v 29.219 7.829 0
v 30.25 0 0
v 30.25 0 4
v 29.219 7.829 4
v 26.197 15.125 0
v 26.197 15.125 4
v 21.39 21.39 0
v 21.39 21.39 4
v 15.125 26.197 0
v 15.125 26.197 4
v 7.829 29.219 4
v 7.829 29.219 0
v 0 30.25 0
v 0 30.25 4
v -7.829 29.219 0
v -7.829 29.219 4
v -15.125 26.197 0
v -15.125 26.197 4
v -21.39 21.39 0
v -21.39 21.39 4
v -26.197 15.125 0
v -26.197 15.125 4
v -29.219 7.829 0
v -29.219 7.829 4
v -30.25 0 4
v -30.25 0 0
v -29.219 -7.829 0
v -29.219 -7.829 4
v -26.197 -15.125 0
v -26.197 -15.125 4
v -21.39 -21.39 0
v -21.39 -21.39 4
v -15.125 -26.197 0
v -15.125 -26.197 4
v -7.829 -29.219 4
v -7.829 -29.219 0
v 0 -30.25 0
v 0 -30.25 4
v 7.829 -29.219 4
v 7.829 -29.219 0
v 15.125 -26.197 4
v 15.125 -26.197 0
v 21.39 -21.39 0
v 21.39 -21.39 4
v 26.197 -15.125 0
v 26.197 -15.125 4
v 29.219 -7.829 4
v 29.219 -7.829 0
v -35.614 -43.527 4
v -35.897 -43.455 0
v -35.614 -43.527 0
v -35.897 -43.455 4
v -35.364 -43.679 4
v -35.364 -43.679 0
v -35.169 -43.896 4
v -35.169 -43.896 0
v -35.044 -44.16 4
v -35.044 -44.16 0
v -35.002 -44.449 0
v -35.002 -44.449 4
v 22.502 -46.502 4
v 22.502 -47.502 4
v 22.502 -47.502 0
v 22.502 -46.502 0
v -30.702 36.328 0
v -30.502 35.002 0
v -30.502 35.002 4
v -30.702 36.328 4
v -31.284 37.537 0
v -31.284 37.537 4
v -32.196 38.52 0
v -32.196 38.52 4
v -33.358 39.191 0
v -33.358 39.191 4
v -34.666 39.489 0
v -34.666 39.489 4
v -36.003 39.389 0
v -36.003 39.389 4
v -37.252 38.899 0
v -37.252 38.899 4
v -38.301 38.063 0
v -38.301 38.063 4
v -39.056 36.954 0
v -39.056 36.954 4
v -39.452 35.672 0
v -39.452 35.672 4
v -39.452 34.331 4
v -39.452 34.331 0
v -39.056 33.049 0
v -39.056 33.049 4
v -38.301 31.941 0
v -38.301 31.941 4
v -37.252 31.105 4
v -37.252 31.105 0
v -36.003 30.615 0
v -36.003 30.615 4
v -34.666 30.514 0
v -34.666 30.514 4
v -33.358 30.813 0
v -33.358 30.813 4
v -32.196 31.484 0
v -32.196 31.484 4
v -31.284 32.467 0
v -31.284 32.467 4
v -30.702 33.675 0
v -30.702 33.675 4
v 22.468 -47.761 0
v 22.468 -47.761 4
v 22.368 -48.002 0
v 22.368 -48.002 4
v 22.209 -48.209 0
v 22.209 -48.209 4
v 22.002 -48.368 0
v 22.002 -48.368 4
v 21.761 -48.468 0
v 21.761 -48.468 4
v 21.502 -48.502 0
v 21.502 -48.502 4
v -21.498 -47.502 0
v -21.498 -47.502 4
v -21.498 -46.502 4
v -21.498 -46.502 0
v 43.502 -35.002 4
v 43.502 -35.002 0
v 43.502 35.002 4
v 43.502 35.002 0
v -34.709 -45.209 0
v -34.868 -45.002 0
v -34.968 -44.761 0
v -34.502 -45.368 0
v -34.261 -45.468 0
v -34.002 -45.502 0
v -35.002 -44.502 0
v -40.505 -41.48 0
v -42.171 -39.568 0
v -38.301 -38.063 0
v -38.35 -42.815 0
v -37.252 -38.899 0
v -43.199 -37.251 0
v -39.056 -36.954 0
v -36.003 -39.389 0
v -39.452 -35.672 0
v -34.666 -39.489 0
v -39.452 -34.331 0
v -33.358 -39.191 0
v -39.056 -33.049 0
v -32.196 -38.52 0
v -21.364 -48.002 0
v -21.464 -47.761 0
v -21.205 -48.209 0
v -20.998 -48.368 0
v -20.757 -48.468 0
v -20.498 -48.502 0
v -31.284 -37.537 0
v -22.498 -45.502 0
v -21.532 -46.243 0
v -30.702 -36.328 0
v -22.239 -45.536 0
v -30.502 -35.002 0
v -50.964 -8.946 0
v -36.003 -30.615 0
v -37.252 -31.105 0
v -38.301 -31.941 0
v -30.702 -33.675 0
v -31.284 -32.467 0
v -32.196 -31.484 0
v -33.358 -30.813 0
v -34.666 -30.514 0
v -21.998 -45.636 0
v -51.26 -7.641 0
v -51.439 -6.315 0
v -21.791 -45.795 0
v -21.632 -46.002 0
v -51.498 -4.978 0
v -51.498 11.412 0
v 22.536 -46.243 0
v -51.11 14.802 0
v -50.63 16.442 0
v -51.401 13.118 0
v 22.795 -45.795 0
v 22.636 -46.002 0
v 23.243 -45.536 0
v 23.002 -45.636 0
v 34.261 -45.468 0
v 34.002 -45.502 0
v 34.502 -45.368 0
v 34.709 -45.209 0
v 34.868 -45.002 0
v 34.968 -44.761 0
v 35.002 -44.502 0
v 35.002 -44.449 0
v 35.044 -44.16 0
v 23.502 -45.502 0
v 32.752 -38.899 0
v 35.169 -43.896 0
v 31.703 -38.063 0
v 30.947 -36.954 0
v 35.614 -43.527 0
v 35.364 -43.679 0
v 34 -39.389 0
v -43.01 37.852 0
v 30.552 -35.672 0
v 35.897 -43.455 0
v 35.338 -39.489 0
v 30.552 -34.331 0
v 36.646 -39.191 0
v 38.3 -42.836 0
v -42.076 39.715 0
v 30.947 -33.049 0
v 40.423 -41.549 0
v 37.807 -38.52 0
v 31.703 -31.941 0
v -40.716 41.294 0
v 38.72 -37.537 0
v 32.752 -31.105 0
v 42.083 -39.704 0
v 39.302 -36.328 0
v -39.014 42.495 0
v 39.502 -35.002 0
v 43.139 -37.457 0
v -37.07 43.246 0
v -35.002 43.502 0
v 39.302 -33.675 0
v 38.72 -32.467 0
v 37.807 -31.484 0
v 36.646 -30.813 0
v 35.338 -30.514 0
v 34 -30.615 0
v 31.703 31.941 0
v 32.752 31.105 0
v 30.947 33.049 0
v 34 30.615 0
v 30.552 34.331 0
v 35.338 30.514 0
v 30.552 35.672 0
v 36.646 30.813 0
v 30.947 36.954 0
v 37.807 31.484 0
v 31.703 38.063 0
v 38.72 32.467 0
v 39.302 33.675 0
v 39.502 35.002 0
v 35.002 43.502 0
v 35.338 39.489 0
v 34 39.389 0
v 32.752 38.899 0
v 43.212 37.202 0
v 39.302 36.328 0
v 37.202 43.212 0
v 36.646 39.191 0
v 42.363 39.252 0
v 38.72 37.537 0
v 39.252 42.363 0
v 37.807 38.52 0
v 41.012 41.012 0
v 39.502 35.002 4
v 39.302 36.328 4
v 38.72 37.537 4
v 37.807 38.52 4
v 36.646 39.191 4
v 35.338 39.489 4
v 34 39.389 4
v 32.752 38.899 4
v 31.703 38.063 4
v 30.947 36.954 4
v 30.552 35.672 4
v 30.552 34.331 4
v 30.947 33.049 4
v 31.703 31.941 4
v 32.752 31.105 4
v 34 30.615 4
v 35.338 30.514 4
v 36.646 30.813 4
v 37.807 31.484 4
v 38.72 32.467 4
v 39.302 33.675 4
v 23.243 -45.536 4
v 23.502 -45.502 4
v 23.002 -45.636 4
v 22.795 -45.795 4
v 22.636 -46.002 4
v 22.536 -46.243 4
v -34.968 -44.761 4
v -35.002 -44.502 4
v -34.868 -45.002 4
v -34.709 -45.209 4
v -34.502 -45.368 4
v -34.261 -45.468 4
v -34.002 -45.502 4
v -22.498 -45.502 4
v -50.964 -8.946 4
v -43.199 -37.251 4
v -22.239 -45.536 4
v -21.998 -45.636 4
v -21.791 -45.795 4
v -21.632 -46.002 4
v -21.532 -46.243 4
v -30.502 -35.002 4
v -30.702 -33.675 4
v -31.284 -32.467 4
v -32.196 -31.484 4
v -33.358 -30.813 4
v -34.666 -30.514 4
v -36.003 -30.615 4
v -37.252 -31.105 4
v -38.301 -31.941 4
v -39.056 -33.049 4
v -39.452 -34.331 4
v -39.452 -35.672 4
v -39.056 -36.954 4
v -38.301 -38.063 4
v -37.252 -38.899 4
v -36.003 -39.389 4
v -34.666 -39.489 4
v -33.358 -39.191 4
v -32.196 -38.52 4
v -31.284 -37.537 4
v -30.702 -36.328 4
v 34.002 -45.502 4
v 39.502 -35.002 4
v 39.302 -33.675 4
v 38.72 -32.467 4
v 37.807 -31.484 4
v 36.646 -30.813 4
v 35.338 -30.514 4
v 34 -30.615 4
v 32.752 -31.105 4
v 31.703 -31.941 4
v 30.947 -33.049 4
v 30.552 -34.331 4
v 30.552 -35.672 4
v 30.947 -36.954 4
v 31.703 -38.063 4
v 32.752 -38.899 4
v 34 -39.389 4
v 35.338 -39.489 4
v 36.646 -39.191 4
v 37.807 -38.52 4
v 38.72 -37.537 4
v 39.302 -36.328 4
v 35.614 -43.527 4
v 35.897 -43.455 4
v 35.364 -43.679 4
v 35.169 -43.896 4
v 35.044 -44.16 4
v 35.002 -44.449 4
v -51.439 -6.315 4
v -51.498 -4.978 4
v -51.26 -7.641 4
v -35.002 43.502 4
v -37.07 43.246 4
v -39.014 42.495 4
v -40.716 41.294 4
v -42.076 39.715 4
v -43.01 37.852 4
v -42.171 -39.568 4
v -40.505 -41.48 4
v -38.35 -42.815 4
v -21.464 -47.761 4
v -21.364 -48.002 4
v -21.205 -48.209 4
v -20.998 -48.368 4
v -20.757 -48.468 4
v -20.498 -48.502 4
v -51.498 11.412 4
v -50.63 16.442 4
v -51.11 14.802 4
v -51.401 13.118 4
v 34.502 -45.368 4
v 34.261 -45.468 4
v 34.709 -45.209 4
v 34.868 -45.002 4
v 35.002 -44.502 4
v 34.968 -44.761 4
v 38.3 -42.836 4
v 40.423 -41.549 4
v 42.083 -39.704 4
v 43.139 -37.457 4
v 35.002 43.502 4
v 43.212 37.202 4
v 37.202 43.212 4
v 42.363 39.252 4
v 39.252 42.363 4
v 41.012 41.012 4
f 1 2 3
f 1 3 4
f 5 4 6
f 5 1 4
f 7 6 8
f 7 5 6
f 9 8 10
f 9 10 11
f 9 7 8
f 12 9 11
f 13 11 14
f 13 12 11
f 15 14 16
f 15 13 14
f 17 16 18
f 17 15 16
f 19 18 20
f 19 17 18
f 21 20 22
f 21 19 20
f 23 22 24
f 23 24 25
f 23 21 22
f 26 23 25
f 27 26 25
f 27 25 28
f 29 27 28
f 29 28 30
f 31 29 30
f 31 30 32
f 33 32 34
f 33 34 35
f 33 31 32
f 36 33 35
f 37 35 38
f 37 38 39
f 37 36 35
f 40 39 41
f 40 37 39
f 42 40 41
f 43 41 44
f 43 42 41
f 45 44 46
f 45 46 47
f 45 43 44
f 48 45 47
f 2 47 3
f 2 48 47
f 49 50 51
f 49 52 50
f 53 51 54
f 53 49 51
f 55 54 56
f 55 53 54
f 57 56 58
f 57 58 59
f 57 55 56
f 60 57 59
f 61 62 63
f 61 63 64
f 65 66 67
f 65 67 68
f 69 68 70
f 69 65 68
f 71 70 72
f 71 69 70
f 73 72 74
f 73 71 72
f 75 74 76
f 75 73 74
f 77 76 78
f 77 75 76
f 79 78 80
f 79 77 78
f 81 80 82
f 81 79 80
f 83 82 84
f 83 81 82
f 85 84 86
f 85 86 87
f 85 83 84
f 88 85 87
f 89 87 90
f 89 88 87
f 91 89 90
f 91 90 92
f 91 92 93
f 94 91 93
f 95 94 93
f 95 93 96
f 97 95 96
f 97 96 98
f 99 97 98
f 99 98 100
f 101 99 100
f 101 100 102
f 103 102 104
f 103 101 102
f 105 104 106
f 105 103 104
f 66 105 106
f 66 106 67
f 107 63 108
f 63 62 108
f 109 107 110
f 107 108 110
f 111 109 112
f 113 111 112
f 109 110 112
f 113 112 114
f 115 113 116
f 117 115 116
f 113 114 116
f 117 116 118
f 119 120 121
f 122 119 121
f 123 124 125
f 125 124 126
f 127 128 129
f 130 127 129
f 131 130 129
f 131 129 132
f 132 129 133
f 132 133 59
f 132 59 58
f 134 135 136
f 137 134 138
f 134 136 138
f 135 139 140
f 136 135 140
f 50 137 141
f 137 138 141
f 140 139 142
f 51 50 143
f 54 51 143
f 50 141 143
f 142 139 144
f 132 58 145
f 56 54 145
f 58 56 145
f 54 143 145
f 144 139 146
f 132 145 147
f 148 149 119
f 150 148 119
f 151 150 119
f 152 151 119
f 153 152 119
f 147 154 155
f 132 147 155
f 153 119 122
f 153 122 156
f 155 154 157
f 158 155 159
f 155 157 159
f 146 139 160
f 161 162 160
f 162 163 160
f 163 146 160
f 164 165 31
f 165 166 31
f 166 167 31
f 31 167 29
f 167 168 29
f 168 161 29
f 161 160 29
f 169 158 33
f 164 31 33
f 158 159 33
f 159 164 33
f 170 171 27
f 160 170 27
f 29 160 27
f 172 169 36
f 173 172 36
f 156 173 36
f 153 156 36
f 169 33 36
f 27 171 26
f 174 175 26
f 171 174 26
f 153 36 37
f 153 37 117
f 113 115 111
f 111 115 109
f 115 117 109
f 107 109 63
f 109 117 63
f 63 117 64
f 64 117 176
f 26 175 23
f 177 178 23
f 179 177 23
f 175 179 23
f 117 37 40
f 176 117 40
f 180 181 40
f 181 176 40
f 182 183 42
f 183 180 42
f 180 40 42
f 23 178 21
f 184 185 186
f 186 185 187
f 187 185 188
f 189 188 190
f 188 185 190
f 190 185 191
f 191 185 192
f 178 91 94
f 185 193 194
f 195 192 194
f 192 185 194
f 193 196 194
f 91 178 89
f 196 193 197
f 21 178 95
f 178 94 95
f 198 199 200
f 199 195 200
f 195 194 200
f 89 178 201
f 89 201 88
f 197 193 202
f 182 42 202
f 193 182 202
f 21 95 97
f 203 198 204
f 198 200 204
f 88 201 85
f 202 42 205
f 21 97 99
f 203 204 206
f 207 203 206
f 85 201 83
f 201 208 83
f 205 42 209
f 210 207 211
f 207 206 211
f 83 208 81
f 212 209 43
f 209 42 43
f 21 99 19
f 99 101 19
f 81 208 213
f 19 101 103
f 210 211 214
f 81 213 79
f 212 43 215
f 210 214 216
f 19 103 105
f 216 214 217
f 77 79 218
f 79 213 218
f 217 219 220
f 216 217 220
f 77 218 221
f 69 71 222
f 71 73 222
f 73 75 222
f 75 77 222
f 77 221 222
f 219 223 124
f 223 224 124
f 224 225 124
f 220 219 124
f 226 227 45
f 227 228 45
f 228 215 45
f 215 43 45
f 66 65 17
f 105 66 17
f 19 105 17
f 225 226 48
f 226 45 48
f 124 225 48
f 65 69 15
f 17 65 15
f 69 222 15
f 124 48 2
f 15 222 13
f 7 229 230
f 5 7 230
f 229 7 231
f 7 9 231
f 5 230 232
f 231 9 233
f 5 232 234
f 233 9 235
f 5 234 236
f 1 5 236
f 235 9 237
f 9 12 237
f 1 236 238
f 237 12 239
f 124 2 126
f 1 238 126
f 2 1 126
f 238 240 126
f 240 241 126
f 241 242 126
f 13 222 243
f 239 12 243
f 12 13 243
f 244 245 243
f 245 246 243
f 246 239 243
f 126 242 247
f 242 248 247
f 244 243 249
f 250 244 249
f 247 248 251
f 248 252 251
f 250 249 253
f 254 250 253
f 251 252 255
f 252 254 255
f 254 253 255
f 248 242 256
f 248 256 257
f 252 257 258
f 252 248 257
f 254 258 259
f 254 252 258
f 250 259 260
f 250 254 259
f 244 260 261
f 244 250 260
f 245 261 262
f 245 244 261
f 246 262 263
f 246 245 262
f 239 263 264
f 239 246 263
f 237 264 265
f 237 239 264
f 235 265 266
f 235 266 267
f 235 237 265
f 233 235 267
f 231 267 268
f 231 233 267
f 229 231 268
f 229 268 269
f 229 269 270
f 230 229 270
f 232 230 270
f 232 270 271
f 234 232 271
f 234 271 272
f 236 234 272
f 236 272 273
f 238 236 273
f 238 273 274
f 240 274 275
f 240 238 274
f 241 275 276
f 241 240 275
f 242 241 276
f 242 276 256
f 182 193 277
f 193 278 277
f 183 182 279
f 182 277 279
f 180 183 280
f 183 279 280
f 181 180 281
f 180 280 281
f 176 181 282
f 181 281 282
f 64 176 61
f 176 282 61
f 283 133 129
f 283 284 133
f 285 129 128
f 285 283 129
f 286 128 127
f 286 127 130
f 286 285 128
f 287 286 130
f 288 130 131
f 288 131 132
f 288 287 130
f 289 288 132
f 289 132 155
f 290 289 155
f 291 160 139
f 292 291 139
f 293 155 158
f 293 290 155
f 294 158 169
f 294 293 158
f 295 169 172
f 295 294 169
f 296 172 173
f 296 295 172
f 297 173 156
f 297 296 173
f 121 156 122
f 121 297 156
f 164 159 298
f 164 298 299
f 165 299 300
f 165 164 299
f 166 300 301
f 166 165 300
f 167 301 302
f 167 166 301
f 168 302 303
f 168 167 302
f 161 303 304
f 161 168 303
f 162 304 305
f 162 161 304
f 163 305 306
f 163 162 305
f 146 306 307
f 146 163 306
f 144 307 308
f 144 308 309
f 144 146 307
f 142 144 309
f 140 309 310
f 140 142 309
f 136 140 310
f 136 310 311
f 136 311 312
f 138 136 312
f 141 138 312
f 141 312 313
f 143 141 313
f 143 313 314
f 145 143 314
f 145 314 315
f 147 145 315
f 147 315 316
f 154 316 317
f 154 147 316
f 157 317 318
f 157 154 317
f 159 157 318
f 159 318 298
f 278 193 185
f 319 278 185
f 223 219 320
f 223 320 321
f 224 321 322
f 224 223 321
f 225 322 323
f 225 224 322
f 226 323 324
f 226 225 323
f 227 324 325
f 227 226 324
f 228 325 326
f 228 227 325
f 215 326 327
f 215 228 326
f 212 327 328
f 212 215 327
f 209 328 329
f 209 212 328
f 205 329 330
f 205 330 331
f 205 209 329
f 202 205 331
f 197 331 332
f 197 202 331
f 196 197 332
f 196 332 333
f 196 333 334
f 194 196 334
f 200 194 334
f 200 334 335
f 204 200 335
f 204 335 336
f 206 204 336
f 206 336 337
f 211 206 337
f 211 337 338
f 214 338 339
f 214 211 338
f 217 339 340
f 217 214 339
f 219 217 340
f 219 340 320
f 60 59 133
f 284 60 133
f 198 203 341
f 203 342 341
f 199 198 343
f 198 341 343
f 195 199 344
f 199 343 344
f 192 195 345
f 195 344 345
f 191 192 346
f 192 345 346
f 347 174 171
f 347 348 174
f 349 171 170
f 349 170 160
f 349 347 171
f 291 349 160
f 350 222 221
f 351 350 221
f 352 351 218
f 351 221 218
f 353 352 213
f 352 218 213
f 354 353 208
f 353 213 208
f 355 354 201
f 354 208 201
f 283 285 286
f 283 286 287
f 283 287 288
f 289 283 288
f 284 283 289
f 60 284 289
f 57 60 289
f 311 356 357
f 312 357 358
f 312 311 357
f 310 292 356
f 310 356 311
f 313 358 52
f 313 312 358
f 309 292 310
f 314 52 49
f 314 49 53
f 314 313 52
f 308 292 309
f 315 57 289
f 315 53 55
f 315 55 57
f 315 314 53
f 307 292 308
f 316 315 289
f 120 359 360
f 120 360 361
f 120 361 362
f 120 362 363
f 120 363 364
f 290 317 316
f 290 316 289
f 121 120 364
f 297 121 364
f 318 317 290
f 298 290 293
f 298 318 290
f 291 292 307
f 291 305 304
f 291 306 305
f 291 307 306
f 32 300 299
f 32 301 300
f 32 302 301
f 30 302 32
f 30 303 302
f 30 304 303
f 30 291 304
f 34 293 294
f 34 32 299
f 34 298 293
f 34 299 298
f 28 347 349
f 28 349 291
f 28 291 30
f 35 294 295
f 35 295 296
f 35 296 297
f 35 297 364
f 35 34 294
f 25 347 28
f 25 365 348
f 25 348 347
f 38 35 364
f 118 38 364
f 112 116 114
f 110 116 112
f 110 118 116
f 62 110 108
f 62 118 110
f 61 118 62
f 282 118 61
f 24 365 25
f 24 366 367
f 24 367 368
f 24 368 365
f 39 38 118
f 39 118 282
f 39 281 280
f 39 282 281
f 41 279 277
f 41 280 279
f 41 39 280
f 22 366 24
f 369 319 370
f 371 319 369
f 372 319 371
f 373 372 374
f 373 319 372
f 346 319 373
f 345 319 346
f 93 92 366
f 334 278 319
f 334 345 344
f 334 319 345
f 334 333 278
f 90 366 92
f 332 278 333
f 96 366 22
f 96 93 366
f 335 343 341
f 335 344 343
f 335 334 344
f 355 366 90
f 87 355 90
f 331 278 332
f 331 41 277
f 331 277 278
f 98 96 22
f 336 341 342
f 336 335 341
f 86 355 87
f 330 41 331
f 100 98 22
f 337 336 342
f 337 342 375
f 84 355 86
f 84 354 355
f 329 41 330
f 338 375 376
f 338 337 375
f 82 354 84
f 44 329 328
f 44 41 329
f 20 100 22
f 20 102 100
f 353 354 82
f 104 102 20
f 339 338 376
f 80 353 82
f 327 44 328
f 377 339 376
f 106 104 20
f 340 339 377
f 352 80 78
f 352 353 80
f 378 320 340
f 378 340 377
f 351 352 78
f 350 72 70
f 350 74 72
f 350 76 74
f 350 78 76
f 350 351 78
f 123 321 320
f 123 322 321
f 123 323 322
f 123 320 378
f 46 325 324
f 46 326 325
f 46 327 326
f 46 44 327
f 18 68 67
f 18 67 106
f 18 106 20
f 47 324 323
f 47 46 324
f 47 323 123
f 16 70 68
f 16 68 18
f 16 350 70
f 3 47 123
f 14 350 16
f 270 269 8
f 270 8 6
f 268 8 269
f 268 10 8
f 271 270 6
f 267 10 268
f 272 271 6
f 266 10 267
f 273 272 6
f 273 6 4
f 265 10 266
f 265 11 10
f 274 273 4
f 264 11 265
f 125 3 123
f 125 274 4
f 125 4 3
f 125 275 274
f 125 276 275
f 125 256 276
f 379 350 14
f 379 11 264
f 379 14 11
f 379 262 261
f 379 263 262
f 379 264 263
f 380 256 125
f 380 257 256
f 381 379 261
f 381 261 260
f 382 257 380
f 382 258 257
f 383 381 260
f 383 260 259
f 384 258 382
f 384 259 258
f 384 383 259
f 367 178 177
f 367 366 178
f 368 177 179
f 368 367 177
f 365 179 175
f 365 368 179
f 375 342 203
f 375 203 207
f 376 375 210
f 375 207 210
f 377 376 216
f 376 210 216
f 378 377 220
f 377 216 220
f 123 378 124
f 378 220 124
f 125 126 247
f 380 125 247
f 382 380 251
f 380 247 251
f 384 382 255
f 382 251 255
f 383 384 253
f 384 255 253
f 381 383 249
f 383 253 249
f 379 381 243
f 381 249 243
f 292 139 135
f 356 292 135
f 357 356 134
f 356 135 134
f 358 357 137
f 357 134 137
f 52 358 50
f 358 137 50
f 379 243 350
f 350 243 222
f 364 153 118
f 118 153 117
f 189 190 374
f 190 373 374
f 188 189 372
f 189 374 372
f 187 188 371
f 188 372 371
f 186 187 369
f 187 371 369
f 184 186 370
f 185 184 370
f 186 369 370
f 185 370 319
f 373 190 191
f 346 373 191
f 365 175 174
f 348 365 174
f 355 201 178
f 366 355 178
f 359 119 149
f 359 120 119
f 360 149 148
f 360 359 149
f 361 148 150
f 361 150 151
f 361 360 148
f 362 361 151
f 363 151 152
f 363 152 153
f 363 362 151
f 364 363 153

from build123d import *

# Parameters (mm, degrees)
F0_R     = 4.5
F0_R_2   = 30.25
F0_W     = 44
F0_H     = 3
F1_DEPTH = 4
F2_R     = 15
F3_R     = 1


with BuildPart() as f1:
    # F0 (on Top) → F1 (new body)
    with BuildSketch(Plane.XY):
        with BuildLine():
            ThreePointArc((-43.501786, 35.001786), (-35.001786, 26.501786), (-26.501786, 35.001786))
            ThreePointArc((-26.501786, 35.001786), (-28.991378, 41.012193), (-35.001786, 43.501786))
            ThreePointArc((-35.001786, 43.501786), (-39.901995, 41.94714), (-43.009713, 37.851891))
            ThreePointArc((-43.009713, 37.851891), (-43.377864, 36.447921), (-43.501786, 35.001786))
        make_face()
        with Locations((-35.001786, 35.001786)):
            Circle(F0_R, mode=Mode.SUBTRACT)
        with BuildLine():
            ThreePointArc((-35.001786, 43.501786), (-28.991378, 41.012193), (-26.501786, 35.001786))
            ThreePointArc((-26.501786, 35.001786), (-35.001786, 26.501786), (-43.501786, 35.001786))
            Line((-43.501786, 35.001786), (-43.501786, -35.001786))
            ThreePointArc((-43.501786, -35.001786), (-35.001786, -26.501786), (-26.501786, -35.001786))
            ThreePointArc((-26.501786, -35.001786), (-28.991378, -41.012193), (-35.001786, -43.501786))
            Line((-35.001786, -43.501786), (35.001786, -43.501786))
            ThreePointArc((35.001786, -43.501786), (28.991378, -28.991378), (43.501786, -35.001786))
            Line((43.501786, -35.001786), (43.501786, 35.001786))
            ThreePointArc((43.501786, 35.001786), (28.991378, 28.991378), (35.001786, 43.501786))
            Line((35.001786, 43.501786), (-35.001786, 43.501786))
        make_face()
        Circle(F0_R_2, mode=Mode.SUBTRACT)
        with BuildLine():
            Line((-43.501786, -35.001786), (-43.501786, 35.001786))
            ThreePointArc((-43.501786, 35.001786), (-43.377864, 36.447921), (-43.009713, 37.851891))
            Line((-43.009713, 37.851891), (-51.498214, 14.001786))
            Line((-51.498214, 14.001786), (-51.498214, -6.998214))
            Line((-51.498214, -6.998214), (-43.198922, -37.250552))
            ThreePointArc((-43.198922, -37.250552), (-43.42573, -36.13632), (-43.501786, -35.001786))
        make_face()
        with BuildLine():
            ThreePointArc((43.501786, 35.001786), (41.012193, 41.012193), (35.001786, 43.501786))
            ThreePointArc((35.001786, 43.501786), (28.991378, 28.991378), (43.501786, 35.001786))
        make_face()
        with Locations((35.001786, 35.001786)):
            Circle(F0_R, mode=Mode.SUBTRACT)
        with BuildLine():
            ThreePointArc((-26.501786, -35.001786), (-35.001786, -26.501786), (-43.501786, -35.001786))
            ThreePointArc((-43.501786, -35.001786), (-43.42573, -36.13632), (-43.198922, -37.250552))
            ThreePointArc((-43.198922, -37.250552), (-40.156176, -41.760651), (-35.001786, -43.501786))
            ThreePointArc((-35.001786, -43.501786), (-28.991378, -41.012193), (-26.501786, -35.001786))
        make_face()
        with Locations((-35.001786, -35.001786)):
            Circle(F0_R, mode=Mode.SUBTRACT)
        with BuildLine():
            ThreePointArc((35.001786, -43.501786), (41.012193, -41.012193), (43.501786, -35.001786))
            ThreePointArc((43.501786, -35.001786), (28.991378, -28.991378), (35.001786, -43.501786))
        make_face()
        with Locations((35.001786, -35.001786)):
            Circle(F0_R, mode=Mode.SUBTRACT)
        Polygon((35.001786, -43.501786), (-35.001786, -43.501786), (-35.001786, -45.501786), (-21.498214, -45.501786), (22.501786, -45.501786), (35.001786, -45.501786), align=None)
        with Locations((0.501786, -47.001786)):
            Rectangle(F0_W, F0_H)
    extrude(amount=F1_DEPTH)

    # F2
    f2_edges = [f1.edges().sort_by_distance(p)[0] for p in [
        (-51.498214, 14.001786, 2),
        (-51.498214, -6.998214, 2),
    ]]
    fillet(f2_edges, radius=F2_R)

    # F3
    f3_edges = [f1.edges().sort_by_distance(p)[0] for p in [
        (-35.001786, -43.501786, 2),
        (-21.498214, -45.501786, 2),
        (22.501786, -45.501786, 2),
        (35.001786, -43.501786, 2),
        (-35.001786, -45.501786, 2),
        (-21.498214, -48.501786, 2),
        (22.501786, -48.501786, 2),
        (35.001786, -45.501786, 2),
    ]]
    fillet(f3_edges, radius=F3_R)


solid = f1.part
